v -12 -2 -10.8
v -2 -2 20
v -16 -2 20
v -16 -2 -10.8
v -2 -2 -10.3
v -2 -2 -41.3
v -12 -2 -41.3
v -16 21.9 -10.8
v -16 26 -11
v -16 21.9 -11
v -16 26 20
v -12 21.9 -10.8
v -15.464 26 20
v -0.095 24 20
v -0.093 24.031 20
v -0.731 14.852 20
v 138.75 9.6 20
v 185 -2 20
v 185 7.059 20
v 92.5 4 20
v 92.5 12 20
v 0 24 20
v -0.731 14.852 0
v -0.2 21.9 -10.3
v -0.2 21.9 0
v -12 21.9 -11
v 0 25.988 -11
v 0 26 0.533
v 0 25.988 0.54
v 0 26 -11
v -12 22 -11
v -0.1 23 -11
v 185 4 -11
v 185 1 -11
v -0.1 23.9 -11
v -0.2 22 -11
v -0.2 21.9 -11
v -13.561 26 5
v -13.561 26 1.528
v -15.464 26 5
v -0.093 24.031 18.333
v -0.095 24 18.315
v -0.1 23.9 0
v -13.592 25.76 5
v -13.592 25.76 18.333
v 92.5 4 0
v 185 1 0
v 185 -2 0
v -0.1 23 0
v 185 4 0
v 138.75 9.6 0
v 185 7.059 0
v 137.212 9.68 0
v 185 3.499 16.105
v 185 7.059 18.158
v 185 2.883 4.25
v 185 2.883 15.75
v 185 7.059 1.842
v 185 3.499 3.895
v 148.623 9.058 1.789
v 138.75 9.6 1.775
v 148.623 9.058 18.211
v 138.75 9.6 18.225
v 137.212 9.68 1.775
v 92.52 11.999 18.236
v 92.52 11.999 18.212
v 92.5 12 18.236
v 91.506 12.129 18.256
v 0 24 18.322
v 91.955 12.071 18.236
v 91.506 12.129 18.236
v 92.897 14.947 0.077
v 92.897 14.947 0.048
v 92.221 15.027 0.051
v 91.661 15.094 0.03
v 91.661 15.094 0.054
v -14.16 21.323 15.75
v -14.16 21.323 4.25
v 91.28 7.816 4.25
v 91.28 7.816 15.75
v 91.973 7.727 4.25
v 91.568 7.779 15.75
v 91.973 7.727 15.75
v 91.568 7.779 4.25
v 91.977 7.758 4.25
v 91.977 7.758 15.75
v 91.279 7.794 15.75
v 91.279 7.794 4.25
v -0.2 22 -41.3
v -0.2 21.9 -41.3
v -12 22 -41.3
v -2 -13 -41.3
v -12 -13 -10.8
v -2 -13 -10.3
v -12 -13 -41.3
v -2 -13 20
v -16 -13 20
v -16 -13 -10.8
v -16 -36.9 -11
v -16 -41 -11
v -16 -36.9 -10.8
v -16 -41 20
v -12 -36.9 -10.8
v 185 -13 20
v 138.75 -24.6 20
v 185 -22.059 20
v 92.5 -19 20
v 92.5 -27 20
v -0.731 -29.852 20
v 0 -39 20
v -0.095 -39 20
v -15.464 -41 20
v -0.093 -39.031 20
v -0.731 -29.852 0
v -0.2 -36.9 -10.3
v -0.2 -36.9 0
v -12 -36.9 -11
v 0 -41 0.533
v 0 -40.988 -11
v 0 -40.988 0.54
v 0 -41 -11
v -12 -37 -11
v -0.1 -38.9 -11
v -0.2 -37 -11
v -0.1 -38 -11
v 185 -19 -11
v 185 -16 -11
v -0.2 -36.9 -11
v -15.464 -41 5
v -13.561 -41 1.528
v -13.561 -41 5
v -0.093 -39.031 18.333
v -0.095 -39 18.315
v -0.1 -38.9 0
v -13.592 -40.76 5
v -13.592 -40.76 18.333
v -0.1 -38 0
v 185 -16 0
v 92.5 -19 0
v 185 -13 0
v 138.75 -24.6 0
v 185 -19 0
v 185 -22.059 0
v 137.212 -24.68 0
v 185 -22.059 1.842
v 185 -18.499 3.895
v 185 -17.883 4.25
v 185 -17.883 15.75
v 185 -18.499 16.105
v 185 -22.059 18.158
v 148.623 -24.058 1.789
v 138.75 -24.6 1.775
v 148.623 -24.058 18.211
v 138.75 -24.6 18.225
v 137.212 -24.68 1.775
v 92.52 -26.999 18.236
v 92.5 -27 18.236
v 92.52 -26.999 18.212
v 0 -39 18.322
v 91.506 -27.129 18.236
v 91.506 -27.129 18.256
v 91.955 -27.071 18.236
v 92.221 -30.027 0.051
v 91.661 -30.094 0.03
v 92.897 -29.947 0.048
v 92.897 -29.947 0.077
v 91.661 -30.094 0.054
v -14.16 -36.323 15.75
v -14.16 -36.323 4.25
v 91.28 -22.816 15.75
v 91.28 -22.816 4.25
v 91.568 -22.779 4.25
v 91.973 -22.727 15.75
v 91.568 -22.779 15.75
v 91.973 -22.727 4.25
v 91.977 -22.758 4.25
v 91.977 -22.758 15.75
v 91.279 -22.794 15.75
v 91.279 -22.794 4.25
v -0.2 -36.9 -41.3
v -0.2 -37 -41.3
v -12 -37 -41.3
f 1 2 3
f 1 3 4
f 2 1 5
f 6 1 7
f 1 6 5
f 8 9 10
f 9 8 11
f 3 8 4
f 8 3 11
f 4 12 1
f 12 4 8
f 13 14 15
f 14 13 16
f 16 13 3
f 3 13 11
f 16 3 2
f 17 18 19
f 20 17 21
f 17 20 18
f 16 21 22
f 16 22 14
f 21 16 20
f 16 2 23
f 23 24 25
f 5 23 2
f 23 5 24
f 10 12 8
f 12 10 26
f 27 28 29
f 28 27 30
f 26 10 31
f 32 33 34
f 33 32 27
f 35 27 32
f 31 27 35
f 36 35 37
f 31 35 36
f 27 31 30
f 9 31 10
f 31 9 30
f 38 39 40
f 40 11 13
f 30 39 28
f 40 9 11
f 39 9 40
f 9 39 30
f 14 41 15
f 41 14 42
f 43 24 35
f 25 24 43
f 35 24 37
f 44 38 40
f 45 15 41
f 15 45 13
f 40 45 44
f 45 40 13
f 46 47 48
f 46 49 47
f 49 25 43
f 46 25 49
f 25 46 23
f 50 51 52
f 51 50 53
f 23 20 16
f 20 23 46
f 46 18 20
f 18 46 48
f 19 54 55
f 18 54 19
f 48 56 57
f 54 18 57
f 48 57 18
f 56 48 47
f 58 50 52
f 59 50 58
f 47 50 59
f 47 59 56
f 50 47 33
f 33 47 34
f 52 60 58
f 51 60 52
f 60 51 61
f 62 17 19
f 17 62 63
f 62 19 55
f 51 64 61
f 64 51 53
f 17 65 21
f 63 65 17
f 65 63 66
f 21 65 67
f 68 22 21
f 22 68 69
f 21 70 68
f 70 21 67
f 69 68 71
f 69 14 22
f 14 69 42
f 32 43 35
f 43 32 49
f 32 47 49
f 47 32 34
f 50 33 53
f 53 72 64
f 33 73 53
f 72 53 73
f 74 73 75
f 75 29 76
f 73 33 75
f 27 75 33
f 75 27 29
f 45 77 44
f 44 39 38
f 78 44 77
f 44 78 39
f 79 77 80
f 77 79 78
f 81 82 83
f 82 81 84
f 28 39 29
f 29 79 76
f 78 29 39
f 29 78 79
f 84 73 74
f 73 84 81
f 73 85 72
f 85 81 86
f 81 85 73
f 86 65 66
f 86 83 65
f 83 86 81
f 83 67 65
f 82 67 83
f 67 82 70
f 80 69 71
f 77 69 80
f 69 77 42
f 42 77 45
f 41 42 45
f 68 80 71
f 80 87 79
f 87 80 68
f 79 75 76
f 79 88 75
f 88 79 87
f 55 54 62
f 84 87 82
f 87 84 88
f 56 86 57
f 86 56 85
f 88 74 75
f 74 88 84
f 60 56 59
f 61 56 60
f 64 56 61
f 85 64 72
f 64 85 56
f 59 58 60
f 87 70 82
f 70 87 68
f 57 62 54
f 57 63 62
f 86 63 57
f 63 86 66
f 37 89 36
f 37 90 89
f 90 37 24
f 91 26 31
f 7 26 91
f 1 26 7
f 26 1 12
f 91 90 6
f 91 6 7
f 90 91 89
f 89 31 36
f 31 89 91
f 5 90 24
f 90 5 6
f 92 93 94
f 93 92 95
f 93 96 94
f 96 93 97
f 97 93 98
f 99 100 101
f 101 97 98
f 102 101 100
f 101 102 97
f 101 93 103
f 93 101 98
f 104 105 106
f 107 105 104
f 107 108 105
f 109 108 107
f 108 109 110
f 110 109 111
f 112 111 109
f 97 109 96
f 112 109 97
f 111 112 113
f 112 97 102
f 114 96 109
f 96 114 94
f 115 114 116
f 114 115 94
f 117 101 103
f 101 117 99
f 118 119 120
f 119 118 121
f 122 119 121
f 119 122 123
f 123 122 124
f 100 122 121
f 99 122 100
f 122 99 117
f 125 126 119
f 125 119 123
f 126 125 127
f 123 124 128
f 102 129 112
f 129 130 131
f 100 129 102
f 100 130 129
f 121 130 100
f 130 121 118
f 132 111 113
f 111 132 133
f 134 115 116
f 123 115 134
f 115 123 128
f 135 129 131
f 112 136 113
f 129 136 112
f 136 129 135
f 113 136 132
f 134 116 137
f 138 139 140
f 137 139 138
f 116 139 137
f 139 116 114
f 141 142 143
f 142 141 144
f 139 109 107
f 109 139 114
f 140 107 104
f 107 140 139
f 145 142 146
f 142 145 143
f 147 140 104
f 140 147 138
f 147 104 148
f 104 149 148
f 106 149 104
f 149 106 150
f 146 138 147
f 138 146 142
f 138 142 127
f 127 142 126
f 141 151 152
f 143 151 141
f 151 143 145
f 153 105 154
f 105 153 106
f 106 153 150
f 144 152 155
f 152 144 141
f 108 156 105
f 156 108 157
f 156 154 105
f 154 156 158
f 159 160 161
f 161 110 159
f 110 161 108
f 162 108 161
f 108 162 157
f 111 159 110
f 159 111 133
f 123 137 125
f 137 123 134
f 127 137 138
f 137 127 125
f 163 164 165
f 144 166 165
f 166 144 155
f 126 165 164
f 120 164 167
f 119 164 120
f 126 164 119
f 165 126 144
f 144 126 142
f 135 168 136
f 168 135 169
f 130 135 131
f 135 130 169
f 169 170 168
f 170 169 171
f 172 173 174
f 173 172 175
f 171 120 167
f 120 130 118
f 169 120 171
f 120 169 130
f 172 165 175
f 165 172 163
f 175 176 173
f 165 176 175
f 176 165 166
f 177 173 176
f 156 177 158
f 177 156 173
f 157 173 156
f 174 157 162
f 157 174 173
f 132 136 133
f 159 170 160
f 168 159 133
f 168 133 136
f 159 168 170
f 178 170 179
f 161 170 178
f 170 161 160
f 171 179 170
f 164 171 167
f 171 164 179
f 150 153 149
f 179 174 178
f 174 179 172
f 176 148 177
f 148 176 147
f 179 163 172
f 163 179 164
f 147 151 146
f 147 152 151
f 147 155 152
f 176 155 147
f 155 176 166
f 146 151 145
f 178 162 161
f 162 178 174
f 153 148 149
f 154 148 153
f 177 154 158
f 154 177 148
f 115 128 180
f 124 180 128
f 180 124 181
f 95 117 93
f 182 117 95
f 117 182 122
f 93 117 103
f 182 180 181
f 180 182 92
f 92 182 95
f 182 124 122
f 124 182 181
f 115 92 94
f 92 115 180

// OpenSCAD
WIDTH = 131;

module gutter() {
  difference() {
    union() {
      linear_extrude(20) 
        polygon([
          [-2,-2],
          [-10,-2],
          [-10, 24],
          [0,24],
          [185 / 2, 24 / 2],
          [6 * 185 / 8, 24 / 2.5],
          [185, 24 / 3.4],
          [185, -2],
          [185 / 2, 4],
          [-2, 15]
        ]);
      
      // BACK
      difference() {
        translate([-16, -2, -11]) {
          translate([0, 0, 0.2]) hull() {
            cube([14, 0.1, 30.8]);
              translate([0, 23.9, 0]) 
                cube([15.8, 0.1, 30.8]);
          }

          hull() {
            translate([0, 23.9, 0]) 
              cube([15.8, 0.1, 31]);
            
            translate([0, 27.9, 0]) 
              cube([16, 0.1, 31]);
          }
        }
         
        translate([-10, 25.3, 5]) 
          rotate([0, 0, -7.3]) 
            translate([-100, 0, 0]) 
              cube([200, 5, 20]);
      }

     // FIN
     translate([0, 0, -11]) 
       linear_extrude(14)
         polygon([
          [-0.1,23],
          [-0.1,26],
          [185,4],
          [185,1],
        ]);
    }
      
    translate([0, 29.55, 10]) 
      rotate([7.3, 90, 0]) 
        translate([0,0,-13])
          cylinder(107, d = 23, $fn = 6);
    
    translate([91.8, 17.74, 10]) 
      rotate([3, 90, 0]) 
        cylinder(100, d = 23, $fn = 6);
  }

  // NOTCH
  translate([-12, -2, -41.3])
    hull() {
      cube([10, 0.1, 31]);
        translate([0, 23.9, 0]) 
          cube([11.8, 0.1, 31]);
    }
}

module backGutter() {
  // BASE
  difference() {
    // FOUNDATION
    translate([4, 11.7, 0])
      hull() {
        cube([14, WIDTH - 1 - 22 - 0.4, 0.1]);
        translate([0, 0, 28.4]) 
          cube([16, WIDTH - 1 - 22 - 0.4, 0.1]);
      }
     
    //cube([15, WIDTH - 1 - 22, 28.5]);
    
    // NICHE
    translate([7.8, 11, -0.1])
      cube([18, 31 + 0.2, 24 + 0.3]);
    
    // NICHE
    translate([7.8, 89, -0.1])
      cube([18, 31 + 0.2, 24 + 0.3]);
    
    // TRIANGLE CUTOUT
    *translate([-1, 65.5, -32])
      rotate([0, 90, 0])
        scale([4, 3, 1])
          cylinder(h = 24, d = 24, $fn = 6);
  }
  
  overhang = 23;
  xMin = 28.5;
  xMax = xMin + 8;
  yMinBase = 4.5;
  yMaxBase = WIDTH - yMinBase - 22;
  yMinTop = yMinBase - overhang;
  yMaxTop = yMaxBase + overhang;
  
  difference() {
    union() {
      translate([4, 11, 0]) 
        rotate([90, 90, 90])
          linear_extrude(16)
            polygon([
              [-xMin + 0.2, yMaxBase + 15],
              [-xMax, yMaxTop],
              [-(xMax + 4), yMaxTop],
              [-(xMax + 4), yMinTop - 3],
              [-xMax, yMinTop - 3],
              [-xMin + 0.2, yMinBase - 15]
            ]);
       
      translate([4.7, 1.5 - 13 + 5, 28 + 5])
        rotate([0, -4, 0])
          cube([30, yMaxTop - yMinTop - 4, 6]);
    }
      
    translate([13, 23, 47.75]) {
      translate([0, 86 + 0.5, 0]) 
        rotate([0, 90, -90]) 
          cylinder(88, d = 24, $fn = 6);

      topGutterSideSlicer();

      mirror([0, 1, 0]) 
        translate([0,  -WIDTH + 46, 0])
          topGutterSideSlicer();
          
    }
  }
}

module topGutterSideSlicer() {
  rotate([-10, 95, -90]) 
    cylinder(45, d = 24, $fn = 6);
}
  
*translate([-20, 0.5, -2])
  backGutter();

*group() {
  translate([0, 1, 0])
  rotate([90, 0, 0]) 
    gutter();

  translate([0, WIDTH, 0])
    mirror([0, 1, 0])
      rotate([90, 0, 0]) 
        gutter();
}

// SIDE GUTTERS FOR PRINTING
group() {
  gutter();
  translate([0, -15, 0]) mirror([0, 1, 0]) gutter();
}
